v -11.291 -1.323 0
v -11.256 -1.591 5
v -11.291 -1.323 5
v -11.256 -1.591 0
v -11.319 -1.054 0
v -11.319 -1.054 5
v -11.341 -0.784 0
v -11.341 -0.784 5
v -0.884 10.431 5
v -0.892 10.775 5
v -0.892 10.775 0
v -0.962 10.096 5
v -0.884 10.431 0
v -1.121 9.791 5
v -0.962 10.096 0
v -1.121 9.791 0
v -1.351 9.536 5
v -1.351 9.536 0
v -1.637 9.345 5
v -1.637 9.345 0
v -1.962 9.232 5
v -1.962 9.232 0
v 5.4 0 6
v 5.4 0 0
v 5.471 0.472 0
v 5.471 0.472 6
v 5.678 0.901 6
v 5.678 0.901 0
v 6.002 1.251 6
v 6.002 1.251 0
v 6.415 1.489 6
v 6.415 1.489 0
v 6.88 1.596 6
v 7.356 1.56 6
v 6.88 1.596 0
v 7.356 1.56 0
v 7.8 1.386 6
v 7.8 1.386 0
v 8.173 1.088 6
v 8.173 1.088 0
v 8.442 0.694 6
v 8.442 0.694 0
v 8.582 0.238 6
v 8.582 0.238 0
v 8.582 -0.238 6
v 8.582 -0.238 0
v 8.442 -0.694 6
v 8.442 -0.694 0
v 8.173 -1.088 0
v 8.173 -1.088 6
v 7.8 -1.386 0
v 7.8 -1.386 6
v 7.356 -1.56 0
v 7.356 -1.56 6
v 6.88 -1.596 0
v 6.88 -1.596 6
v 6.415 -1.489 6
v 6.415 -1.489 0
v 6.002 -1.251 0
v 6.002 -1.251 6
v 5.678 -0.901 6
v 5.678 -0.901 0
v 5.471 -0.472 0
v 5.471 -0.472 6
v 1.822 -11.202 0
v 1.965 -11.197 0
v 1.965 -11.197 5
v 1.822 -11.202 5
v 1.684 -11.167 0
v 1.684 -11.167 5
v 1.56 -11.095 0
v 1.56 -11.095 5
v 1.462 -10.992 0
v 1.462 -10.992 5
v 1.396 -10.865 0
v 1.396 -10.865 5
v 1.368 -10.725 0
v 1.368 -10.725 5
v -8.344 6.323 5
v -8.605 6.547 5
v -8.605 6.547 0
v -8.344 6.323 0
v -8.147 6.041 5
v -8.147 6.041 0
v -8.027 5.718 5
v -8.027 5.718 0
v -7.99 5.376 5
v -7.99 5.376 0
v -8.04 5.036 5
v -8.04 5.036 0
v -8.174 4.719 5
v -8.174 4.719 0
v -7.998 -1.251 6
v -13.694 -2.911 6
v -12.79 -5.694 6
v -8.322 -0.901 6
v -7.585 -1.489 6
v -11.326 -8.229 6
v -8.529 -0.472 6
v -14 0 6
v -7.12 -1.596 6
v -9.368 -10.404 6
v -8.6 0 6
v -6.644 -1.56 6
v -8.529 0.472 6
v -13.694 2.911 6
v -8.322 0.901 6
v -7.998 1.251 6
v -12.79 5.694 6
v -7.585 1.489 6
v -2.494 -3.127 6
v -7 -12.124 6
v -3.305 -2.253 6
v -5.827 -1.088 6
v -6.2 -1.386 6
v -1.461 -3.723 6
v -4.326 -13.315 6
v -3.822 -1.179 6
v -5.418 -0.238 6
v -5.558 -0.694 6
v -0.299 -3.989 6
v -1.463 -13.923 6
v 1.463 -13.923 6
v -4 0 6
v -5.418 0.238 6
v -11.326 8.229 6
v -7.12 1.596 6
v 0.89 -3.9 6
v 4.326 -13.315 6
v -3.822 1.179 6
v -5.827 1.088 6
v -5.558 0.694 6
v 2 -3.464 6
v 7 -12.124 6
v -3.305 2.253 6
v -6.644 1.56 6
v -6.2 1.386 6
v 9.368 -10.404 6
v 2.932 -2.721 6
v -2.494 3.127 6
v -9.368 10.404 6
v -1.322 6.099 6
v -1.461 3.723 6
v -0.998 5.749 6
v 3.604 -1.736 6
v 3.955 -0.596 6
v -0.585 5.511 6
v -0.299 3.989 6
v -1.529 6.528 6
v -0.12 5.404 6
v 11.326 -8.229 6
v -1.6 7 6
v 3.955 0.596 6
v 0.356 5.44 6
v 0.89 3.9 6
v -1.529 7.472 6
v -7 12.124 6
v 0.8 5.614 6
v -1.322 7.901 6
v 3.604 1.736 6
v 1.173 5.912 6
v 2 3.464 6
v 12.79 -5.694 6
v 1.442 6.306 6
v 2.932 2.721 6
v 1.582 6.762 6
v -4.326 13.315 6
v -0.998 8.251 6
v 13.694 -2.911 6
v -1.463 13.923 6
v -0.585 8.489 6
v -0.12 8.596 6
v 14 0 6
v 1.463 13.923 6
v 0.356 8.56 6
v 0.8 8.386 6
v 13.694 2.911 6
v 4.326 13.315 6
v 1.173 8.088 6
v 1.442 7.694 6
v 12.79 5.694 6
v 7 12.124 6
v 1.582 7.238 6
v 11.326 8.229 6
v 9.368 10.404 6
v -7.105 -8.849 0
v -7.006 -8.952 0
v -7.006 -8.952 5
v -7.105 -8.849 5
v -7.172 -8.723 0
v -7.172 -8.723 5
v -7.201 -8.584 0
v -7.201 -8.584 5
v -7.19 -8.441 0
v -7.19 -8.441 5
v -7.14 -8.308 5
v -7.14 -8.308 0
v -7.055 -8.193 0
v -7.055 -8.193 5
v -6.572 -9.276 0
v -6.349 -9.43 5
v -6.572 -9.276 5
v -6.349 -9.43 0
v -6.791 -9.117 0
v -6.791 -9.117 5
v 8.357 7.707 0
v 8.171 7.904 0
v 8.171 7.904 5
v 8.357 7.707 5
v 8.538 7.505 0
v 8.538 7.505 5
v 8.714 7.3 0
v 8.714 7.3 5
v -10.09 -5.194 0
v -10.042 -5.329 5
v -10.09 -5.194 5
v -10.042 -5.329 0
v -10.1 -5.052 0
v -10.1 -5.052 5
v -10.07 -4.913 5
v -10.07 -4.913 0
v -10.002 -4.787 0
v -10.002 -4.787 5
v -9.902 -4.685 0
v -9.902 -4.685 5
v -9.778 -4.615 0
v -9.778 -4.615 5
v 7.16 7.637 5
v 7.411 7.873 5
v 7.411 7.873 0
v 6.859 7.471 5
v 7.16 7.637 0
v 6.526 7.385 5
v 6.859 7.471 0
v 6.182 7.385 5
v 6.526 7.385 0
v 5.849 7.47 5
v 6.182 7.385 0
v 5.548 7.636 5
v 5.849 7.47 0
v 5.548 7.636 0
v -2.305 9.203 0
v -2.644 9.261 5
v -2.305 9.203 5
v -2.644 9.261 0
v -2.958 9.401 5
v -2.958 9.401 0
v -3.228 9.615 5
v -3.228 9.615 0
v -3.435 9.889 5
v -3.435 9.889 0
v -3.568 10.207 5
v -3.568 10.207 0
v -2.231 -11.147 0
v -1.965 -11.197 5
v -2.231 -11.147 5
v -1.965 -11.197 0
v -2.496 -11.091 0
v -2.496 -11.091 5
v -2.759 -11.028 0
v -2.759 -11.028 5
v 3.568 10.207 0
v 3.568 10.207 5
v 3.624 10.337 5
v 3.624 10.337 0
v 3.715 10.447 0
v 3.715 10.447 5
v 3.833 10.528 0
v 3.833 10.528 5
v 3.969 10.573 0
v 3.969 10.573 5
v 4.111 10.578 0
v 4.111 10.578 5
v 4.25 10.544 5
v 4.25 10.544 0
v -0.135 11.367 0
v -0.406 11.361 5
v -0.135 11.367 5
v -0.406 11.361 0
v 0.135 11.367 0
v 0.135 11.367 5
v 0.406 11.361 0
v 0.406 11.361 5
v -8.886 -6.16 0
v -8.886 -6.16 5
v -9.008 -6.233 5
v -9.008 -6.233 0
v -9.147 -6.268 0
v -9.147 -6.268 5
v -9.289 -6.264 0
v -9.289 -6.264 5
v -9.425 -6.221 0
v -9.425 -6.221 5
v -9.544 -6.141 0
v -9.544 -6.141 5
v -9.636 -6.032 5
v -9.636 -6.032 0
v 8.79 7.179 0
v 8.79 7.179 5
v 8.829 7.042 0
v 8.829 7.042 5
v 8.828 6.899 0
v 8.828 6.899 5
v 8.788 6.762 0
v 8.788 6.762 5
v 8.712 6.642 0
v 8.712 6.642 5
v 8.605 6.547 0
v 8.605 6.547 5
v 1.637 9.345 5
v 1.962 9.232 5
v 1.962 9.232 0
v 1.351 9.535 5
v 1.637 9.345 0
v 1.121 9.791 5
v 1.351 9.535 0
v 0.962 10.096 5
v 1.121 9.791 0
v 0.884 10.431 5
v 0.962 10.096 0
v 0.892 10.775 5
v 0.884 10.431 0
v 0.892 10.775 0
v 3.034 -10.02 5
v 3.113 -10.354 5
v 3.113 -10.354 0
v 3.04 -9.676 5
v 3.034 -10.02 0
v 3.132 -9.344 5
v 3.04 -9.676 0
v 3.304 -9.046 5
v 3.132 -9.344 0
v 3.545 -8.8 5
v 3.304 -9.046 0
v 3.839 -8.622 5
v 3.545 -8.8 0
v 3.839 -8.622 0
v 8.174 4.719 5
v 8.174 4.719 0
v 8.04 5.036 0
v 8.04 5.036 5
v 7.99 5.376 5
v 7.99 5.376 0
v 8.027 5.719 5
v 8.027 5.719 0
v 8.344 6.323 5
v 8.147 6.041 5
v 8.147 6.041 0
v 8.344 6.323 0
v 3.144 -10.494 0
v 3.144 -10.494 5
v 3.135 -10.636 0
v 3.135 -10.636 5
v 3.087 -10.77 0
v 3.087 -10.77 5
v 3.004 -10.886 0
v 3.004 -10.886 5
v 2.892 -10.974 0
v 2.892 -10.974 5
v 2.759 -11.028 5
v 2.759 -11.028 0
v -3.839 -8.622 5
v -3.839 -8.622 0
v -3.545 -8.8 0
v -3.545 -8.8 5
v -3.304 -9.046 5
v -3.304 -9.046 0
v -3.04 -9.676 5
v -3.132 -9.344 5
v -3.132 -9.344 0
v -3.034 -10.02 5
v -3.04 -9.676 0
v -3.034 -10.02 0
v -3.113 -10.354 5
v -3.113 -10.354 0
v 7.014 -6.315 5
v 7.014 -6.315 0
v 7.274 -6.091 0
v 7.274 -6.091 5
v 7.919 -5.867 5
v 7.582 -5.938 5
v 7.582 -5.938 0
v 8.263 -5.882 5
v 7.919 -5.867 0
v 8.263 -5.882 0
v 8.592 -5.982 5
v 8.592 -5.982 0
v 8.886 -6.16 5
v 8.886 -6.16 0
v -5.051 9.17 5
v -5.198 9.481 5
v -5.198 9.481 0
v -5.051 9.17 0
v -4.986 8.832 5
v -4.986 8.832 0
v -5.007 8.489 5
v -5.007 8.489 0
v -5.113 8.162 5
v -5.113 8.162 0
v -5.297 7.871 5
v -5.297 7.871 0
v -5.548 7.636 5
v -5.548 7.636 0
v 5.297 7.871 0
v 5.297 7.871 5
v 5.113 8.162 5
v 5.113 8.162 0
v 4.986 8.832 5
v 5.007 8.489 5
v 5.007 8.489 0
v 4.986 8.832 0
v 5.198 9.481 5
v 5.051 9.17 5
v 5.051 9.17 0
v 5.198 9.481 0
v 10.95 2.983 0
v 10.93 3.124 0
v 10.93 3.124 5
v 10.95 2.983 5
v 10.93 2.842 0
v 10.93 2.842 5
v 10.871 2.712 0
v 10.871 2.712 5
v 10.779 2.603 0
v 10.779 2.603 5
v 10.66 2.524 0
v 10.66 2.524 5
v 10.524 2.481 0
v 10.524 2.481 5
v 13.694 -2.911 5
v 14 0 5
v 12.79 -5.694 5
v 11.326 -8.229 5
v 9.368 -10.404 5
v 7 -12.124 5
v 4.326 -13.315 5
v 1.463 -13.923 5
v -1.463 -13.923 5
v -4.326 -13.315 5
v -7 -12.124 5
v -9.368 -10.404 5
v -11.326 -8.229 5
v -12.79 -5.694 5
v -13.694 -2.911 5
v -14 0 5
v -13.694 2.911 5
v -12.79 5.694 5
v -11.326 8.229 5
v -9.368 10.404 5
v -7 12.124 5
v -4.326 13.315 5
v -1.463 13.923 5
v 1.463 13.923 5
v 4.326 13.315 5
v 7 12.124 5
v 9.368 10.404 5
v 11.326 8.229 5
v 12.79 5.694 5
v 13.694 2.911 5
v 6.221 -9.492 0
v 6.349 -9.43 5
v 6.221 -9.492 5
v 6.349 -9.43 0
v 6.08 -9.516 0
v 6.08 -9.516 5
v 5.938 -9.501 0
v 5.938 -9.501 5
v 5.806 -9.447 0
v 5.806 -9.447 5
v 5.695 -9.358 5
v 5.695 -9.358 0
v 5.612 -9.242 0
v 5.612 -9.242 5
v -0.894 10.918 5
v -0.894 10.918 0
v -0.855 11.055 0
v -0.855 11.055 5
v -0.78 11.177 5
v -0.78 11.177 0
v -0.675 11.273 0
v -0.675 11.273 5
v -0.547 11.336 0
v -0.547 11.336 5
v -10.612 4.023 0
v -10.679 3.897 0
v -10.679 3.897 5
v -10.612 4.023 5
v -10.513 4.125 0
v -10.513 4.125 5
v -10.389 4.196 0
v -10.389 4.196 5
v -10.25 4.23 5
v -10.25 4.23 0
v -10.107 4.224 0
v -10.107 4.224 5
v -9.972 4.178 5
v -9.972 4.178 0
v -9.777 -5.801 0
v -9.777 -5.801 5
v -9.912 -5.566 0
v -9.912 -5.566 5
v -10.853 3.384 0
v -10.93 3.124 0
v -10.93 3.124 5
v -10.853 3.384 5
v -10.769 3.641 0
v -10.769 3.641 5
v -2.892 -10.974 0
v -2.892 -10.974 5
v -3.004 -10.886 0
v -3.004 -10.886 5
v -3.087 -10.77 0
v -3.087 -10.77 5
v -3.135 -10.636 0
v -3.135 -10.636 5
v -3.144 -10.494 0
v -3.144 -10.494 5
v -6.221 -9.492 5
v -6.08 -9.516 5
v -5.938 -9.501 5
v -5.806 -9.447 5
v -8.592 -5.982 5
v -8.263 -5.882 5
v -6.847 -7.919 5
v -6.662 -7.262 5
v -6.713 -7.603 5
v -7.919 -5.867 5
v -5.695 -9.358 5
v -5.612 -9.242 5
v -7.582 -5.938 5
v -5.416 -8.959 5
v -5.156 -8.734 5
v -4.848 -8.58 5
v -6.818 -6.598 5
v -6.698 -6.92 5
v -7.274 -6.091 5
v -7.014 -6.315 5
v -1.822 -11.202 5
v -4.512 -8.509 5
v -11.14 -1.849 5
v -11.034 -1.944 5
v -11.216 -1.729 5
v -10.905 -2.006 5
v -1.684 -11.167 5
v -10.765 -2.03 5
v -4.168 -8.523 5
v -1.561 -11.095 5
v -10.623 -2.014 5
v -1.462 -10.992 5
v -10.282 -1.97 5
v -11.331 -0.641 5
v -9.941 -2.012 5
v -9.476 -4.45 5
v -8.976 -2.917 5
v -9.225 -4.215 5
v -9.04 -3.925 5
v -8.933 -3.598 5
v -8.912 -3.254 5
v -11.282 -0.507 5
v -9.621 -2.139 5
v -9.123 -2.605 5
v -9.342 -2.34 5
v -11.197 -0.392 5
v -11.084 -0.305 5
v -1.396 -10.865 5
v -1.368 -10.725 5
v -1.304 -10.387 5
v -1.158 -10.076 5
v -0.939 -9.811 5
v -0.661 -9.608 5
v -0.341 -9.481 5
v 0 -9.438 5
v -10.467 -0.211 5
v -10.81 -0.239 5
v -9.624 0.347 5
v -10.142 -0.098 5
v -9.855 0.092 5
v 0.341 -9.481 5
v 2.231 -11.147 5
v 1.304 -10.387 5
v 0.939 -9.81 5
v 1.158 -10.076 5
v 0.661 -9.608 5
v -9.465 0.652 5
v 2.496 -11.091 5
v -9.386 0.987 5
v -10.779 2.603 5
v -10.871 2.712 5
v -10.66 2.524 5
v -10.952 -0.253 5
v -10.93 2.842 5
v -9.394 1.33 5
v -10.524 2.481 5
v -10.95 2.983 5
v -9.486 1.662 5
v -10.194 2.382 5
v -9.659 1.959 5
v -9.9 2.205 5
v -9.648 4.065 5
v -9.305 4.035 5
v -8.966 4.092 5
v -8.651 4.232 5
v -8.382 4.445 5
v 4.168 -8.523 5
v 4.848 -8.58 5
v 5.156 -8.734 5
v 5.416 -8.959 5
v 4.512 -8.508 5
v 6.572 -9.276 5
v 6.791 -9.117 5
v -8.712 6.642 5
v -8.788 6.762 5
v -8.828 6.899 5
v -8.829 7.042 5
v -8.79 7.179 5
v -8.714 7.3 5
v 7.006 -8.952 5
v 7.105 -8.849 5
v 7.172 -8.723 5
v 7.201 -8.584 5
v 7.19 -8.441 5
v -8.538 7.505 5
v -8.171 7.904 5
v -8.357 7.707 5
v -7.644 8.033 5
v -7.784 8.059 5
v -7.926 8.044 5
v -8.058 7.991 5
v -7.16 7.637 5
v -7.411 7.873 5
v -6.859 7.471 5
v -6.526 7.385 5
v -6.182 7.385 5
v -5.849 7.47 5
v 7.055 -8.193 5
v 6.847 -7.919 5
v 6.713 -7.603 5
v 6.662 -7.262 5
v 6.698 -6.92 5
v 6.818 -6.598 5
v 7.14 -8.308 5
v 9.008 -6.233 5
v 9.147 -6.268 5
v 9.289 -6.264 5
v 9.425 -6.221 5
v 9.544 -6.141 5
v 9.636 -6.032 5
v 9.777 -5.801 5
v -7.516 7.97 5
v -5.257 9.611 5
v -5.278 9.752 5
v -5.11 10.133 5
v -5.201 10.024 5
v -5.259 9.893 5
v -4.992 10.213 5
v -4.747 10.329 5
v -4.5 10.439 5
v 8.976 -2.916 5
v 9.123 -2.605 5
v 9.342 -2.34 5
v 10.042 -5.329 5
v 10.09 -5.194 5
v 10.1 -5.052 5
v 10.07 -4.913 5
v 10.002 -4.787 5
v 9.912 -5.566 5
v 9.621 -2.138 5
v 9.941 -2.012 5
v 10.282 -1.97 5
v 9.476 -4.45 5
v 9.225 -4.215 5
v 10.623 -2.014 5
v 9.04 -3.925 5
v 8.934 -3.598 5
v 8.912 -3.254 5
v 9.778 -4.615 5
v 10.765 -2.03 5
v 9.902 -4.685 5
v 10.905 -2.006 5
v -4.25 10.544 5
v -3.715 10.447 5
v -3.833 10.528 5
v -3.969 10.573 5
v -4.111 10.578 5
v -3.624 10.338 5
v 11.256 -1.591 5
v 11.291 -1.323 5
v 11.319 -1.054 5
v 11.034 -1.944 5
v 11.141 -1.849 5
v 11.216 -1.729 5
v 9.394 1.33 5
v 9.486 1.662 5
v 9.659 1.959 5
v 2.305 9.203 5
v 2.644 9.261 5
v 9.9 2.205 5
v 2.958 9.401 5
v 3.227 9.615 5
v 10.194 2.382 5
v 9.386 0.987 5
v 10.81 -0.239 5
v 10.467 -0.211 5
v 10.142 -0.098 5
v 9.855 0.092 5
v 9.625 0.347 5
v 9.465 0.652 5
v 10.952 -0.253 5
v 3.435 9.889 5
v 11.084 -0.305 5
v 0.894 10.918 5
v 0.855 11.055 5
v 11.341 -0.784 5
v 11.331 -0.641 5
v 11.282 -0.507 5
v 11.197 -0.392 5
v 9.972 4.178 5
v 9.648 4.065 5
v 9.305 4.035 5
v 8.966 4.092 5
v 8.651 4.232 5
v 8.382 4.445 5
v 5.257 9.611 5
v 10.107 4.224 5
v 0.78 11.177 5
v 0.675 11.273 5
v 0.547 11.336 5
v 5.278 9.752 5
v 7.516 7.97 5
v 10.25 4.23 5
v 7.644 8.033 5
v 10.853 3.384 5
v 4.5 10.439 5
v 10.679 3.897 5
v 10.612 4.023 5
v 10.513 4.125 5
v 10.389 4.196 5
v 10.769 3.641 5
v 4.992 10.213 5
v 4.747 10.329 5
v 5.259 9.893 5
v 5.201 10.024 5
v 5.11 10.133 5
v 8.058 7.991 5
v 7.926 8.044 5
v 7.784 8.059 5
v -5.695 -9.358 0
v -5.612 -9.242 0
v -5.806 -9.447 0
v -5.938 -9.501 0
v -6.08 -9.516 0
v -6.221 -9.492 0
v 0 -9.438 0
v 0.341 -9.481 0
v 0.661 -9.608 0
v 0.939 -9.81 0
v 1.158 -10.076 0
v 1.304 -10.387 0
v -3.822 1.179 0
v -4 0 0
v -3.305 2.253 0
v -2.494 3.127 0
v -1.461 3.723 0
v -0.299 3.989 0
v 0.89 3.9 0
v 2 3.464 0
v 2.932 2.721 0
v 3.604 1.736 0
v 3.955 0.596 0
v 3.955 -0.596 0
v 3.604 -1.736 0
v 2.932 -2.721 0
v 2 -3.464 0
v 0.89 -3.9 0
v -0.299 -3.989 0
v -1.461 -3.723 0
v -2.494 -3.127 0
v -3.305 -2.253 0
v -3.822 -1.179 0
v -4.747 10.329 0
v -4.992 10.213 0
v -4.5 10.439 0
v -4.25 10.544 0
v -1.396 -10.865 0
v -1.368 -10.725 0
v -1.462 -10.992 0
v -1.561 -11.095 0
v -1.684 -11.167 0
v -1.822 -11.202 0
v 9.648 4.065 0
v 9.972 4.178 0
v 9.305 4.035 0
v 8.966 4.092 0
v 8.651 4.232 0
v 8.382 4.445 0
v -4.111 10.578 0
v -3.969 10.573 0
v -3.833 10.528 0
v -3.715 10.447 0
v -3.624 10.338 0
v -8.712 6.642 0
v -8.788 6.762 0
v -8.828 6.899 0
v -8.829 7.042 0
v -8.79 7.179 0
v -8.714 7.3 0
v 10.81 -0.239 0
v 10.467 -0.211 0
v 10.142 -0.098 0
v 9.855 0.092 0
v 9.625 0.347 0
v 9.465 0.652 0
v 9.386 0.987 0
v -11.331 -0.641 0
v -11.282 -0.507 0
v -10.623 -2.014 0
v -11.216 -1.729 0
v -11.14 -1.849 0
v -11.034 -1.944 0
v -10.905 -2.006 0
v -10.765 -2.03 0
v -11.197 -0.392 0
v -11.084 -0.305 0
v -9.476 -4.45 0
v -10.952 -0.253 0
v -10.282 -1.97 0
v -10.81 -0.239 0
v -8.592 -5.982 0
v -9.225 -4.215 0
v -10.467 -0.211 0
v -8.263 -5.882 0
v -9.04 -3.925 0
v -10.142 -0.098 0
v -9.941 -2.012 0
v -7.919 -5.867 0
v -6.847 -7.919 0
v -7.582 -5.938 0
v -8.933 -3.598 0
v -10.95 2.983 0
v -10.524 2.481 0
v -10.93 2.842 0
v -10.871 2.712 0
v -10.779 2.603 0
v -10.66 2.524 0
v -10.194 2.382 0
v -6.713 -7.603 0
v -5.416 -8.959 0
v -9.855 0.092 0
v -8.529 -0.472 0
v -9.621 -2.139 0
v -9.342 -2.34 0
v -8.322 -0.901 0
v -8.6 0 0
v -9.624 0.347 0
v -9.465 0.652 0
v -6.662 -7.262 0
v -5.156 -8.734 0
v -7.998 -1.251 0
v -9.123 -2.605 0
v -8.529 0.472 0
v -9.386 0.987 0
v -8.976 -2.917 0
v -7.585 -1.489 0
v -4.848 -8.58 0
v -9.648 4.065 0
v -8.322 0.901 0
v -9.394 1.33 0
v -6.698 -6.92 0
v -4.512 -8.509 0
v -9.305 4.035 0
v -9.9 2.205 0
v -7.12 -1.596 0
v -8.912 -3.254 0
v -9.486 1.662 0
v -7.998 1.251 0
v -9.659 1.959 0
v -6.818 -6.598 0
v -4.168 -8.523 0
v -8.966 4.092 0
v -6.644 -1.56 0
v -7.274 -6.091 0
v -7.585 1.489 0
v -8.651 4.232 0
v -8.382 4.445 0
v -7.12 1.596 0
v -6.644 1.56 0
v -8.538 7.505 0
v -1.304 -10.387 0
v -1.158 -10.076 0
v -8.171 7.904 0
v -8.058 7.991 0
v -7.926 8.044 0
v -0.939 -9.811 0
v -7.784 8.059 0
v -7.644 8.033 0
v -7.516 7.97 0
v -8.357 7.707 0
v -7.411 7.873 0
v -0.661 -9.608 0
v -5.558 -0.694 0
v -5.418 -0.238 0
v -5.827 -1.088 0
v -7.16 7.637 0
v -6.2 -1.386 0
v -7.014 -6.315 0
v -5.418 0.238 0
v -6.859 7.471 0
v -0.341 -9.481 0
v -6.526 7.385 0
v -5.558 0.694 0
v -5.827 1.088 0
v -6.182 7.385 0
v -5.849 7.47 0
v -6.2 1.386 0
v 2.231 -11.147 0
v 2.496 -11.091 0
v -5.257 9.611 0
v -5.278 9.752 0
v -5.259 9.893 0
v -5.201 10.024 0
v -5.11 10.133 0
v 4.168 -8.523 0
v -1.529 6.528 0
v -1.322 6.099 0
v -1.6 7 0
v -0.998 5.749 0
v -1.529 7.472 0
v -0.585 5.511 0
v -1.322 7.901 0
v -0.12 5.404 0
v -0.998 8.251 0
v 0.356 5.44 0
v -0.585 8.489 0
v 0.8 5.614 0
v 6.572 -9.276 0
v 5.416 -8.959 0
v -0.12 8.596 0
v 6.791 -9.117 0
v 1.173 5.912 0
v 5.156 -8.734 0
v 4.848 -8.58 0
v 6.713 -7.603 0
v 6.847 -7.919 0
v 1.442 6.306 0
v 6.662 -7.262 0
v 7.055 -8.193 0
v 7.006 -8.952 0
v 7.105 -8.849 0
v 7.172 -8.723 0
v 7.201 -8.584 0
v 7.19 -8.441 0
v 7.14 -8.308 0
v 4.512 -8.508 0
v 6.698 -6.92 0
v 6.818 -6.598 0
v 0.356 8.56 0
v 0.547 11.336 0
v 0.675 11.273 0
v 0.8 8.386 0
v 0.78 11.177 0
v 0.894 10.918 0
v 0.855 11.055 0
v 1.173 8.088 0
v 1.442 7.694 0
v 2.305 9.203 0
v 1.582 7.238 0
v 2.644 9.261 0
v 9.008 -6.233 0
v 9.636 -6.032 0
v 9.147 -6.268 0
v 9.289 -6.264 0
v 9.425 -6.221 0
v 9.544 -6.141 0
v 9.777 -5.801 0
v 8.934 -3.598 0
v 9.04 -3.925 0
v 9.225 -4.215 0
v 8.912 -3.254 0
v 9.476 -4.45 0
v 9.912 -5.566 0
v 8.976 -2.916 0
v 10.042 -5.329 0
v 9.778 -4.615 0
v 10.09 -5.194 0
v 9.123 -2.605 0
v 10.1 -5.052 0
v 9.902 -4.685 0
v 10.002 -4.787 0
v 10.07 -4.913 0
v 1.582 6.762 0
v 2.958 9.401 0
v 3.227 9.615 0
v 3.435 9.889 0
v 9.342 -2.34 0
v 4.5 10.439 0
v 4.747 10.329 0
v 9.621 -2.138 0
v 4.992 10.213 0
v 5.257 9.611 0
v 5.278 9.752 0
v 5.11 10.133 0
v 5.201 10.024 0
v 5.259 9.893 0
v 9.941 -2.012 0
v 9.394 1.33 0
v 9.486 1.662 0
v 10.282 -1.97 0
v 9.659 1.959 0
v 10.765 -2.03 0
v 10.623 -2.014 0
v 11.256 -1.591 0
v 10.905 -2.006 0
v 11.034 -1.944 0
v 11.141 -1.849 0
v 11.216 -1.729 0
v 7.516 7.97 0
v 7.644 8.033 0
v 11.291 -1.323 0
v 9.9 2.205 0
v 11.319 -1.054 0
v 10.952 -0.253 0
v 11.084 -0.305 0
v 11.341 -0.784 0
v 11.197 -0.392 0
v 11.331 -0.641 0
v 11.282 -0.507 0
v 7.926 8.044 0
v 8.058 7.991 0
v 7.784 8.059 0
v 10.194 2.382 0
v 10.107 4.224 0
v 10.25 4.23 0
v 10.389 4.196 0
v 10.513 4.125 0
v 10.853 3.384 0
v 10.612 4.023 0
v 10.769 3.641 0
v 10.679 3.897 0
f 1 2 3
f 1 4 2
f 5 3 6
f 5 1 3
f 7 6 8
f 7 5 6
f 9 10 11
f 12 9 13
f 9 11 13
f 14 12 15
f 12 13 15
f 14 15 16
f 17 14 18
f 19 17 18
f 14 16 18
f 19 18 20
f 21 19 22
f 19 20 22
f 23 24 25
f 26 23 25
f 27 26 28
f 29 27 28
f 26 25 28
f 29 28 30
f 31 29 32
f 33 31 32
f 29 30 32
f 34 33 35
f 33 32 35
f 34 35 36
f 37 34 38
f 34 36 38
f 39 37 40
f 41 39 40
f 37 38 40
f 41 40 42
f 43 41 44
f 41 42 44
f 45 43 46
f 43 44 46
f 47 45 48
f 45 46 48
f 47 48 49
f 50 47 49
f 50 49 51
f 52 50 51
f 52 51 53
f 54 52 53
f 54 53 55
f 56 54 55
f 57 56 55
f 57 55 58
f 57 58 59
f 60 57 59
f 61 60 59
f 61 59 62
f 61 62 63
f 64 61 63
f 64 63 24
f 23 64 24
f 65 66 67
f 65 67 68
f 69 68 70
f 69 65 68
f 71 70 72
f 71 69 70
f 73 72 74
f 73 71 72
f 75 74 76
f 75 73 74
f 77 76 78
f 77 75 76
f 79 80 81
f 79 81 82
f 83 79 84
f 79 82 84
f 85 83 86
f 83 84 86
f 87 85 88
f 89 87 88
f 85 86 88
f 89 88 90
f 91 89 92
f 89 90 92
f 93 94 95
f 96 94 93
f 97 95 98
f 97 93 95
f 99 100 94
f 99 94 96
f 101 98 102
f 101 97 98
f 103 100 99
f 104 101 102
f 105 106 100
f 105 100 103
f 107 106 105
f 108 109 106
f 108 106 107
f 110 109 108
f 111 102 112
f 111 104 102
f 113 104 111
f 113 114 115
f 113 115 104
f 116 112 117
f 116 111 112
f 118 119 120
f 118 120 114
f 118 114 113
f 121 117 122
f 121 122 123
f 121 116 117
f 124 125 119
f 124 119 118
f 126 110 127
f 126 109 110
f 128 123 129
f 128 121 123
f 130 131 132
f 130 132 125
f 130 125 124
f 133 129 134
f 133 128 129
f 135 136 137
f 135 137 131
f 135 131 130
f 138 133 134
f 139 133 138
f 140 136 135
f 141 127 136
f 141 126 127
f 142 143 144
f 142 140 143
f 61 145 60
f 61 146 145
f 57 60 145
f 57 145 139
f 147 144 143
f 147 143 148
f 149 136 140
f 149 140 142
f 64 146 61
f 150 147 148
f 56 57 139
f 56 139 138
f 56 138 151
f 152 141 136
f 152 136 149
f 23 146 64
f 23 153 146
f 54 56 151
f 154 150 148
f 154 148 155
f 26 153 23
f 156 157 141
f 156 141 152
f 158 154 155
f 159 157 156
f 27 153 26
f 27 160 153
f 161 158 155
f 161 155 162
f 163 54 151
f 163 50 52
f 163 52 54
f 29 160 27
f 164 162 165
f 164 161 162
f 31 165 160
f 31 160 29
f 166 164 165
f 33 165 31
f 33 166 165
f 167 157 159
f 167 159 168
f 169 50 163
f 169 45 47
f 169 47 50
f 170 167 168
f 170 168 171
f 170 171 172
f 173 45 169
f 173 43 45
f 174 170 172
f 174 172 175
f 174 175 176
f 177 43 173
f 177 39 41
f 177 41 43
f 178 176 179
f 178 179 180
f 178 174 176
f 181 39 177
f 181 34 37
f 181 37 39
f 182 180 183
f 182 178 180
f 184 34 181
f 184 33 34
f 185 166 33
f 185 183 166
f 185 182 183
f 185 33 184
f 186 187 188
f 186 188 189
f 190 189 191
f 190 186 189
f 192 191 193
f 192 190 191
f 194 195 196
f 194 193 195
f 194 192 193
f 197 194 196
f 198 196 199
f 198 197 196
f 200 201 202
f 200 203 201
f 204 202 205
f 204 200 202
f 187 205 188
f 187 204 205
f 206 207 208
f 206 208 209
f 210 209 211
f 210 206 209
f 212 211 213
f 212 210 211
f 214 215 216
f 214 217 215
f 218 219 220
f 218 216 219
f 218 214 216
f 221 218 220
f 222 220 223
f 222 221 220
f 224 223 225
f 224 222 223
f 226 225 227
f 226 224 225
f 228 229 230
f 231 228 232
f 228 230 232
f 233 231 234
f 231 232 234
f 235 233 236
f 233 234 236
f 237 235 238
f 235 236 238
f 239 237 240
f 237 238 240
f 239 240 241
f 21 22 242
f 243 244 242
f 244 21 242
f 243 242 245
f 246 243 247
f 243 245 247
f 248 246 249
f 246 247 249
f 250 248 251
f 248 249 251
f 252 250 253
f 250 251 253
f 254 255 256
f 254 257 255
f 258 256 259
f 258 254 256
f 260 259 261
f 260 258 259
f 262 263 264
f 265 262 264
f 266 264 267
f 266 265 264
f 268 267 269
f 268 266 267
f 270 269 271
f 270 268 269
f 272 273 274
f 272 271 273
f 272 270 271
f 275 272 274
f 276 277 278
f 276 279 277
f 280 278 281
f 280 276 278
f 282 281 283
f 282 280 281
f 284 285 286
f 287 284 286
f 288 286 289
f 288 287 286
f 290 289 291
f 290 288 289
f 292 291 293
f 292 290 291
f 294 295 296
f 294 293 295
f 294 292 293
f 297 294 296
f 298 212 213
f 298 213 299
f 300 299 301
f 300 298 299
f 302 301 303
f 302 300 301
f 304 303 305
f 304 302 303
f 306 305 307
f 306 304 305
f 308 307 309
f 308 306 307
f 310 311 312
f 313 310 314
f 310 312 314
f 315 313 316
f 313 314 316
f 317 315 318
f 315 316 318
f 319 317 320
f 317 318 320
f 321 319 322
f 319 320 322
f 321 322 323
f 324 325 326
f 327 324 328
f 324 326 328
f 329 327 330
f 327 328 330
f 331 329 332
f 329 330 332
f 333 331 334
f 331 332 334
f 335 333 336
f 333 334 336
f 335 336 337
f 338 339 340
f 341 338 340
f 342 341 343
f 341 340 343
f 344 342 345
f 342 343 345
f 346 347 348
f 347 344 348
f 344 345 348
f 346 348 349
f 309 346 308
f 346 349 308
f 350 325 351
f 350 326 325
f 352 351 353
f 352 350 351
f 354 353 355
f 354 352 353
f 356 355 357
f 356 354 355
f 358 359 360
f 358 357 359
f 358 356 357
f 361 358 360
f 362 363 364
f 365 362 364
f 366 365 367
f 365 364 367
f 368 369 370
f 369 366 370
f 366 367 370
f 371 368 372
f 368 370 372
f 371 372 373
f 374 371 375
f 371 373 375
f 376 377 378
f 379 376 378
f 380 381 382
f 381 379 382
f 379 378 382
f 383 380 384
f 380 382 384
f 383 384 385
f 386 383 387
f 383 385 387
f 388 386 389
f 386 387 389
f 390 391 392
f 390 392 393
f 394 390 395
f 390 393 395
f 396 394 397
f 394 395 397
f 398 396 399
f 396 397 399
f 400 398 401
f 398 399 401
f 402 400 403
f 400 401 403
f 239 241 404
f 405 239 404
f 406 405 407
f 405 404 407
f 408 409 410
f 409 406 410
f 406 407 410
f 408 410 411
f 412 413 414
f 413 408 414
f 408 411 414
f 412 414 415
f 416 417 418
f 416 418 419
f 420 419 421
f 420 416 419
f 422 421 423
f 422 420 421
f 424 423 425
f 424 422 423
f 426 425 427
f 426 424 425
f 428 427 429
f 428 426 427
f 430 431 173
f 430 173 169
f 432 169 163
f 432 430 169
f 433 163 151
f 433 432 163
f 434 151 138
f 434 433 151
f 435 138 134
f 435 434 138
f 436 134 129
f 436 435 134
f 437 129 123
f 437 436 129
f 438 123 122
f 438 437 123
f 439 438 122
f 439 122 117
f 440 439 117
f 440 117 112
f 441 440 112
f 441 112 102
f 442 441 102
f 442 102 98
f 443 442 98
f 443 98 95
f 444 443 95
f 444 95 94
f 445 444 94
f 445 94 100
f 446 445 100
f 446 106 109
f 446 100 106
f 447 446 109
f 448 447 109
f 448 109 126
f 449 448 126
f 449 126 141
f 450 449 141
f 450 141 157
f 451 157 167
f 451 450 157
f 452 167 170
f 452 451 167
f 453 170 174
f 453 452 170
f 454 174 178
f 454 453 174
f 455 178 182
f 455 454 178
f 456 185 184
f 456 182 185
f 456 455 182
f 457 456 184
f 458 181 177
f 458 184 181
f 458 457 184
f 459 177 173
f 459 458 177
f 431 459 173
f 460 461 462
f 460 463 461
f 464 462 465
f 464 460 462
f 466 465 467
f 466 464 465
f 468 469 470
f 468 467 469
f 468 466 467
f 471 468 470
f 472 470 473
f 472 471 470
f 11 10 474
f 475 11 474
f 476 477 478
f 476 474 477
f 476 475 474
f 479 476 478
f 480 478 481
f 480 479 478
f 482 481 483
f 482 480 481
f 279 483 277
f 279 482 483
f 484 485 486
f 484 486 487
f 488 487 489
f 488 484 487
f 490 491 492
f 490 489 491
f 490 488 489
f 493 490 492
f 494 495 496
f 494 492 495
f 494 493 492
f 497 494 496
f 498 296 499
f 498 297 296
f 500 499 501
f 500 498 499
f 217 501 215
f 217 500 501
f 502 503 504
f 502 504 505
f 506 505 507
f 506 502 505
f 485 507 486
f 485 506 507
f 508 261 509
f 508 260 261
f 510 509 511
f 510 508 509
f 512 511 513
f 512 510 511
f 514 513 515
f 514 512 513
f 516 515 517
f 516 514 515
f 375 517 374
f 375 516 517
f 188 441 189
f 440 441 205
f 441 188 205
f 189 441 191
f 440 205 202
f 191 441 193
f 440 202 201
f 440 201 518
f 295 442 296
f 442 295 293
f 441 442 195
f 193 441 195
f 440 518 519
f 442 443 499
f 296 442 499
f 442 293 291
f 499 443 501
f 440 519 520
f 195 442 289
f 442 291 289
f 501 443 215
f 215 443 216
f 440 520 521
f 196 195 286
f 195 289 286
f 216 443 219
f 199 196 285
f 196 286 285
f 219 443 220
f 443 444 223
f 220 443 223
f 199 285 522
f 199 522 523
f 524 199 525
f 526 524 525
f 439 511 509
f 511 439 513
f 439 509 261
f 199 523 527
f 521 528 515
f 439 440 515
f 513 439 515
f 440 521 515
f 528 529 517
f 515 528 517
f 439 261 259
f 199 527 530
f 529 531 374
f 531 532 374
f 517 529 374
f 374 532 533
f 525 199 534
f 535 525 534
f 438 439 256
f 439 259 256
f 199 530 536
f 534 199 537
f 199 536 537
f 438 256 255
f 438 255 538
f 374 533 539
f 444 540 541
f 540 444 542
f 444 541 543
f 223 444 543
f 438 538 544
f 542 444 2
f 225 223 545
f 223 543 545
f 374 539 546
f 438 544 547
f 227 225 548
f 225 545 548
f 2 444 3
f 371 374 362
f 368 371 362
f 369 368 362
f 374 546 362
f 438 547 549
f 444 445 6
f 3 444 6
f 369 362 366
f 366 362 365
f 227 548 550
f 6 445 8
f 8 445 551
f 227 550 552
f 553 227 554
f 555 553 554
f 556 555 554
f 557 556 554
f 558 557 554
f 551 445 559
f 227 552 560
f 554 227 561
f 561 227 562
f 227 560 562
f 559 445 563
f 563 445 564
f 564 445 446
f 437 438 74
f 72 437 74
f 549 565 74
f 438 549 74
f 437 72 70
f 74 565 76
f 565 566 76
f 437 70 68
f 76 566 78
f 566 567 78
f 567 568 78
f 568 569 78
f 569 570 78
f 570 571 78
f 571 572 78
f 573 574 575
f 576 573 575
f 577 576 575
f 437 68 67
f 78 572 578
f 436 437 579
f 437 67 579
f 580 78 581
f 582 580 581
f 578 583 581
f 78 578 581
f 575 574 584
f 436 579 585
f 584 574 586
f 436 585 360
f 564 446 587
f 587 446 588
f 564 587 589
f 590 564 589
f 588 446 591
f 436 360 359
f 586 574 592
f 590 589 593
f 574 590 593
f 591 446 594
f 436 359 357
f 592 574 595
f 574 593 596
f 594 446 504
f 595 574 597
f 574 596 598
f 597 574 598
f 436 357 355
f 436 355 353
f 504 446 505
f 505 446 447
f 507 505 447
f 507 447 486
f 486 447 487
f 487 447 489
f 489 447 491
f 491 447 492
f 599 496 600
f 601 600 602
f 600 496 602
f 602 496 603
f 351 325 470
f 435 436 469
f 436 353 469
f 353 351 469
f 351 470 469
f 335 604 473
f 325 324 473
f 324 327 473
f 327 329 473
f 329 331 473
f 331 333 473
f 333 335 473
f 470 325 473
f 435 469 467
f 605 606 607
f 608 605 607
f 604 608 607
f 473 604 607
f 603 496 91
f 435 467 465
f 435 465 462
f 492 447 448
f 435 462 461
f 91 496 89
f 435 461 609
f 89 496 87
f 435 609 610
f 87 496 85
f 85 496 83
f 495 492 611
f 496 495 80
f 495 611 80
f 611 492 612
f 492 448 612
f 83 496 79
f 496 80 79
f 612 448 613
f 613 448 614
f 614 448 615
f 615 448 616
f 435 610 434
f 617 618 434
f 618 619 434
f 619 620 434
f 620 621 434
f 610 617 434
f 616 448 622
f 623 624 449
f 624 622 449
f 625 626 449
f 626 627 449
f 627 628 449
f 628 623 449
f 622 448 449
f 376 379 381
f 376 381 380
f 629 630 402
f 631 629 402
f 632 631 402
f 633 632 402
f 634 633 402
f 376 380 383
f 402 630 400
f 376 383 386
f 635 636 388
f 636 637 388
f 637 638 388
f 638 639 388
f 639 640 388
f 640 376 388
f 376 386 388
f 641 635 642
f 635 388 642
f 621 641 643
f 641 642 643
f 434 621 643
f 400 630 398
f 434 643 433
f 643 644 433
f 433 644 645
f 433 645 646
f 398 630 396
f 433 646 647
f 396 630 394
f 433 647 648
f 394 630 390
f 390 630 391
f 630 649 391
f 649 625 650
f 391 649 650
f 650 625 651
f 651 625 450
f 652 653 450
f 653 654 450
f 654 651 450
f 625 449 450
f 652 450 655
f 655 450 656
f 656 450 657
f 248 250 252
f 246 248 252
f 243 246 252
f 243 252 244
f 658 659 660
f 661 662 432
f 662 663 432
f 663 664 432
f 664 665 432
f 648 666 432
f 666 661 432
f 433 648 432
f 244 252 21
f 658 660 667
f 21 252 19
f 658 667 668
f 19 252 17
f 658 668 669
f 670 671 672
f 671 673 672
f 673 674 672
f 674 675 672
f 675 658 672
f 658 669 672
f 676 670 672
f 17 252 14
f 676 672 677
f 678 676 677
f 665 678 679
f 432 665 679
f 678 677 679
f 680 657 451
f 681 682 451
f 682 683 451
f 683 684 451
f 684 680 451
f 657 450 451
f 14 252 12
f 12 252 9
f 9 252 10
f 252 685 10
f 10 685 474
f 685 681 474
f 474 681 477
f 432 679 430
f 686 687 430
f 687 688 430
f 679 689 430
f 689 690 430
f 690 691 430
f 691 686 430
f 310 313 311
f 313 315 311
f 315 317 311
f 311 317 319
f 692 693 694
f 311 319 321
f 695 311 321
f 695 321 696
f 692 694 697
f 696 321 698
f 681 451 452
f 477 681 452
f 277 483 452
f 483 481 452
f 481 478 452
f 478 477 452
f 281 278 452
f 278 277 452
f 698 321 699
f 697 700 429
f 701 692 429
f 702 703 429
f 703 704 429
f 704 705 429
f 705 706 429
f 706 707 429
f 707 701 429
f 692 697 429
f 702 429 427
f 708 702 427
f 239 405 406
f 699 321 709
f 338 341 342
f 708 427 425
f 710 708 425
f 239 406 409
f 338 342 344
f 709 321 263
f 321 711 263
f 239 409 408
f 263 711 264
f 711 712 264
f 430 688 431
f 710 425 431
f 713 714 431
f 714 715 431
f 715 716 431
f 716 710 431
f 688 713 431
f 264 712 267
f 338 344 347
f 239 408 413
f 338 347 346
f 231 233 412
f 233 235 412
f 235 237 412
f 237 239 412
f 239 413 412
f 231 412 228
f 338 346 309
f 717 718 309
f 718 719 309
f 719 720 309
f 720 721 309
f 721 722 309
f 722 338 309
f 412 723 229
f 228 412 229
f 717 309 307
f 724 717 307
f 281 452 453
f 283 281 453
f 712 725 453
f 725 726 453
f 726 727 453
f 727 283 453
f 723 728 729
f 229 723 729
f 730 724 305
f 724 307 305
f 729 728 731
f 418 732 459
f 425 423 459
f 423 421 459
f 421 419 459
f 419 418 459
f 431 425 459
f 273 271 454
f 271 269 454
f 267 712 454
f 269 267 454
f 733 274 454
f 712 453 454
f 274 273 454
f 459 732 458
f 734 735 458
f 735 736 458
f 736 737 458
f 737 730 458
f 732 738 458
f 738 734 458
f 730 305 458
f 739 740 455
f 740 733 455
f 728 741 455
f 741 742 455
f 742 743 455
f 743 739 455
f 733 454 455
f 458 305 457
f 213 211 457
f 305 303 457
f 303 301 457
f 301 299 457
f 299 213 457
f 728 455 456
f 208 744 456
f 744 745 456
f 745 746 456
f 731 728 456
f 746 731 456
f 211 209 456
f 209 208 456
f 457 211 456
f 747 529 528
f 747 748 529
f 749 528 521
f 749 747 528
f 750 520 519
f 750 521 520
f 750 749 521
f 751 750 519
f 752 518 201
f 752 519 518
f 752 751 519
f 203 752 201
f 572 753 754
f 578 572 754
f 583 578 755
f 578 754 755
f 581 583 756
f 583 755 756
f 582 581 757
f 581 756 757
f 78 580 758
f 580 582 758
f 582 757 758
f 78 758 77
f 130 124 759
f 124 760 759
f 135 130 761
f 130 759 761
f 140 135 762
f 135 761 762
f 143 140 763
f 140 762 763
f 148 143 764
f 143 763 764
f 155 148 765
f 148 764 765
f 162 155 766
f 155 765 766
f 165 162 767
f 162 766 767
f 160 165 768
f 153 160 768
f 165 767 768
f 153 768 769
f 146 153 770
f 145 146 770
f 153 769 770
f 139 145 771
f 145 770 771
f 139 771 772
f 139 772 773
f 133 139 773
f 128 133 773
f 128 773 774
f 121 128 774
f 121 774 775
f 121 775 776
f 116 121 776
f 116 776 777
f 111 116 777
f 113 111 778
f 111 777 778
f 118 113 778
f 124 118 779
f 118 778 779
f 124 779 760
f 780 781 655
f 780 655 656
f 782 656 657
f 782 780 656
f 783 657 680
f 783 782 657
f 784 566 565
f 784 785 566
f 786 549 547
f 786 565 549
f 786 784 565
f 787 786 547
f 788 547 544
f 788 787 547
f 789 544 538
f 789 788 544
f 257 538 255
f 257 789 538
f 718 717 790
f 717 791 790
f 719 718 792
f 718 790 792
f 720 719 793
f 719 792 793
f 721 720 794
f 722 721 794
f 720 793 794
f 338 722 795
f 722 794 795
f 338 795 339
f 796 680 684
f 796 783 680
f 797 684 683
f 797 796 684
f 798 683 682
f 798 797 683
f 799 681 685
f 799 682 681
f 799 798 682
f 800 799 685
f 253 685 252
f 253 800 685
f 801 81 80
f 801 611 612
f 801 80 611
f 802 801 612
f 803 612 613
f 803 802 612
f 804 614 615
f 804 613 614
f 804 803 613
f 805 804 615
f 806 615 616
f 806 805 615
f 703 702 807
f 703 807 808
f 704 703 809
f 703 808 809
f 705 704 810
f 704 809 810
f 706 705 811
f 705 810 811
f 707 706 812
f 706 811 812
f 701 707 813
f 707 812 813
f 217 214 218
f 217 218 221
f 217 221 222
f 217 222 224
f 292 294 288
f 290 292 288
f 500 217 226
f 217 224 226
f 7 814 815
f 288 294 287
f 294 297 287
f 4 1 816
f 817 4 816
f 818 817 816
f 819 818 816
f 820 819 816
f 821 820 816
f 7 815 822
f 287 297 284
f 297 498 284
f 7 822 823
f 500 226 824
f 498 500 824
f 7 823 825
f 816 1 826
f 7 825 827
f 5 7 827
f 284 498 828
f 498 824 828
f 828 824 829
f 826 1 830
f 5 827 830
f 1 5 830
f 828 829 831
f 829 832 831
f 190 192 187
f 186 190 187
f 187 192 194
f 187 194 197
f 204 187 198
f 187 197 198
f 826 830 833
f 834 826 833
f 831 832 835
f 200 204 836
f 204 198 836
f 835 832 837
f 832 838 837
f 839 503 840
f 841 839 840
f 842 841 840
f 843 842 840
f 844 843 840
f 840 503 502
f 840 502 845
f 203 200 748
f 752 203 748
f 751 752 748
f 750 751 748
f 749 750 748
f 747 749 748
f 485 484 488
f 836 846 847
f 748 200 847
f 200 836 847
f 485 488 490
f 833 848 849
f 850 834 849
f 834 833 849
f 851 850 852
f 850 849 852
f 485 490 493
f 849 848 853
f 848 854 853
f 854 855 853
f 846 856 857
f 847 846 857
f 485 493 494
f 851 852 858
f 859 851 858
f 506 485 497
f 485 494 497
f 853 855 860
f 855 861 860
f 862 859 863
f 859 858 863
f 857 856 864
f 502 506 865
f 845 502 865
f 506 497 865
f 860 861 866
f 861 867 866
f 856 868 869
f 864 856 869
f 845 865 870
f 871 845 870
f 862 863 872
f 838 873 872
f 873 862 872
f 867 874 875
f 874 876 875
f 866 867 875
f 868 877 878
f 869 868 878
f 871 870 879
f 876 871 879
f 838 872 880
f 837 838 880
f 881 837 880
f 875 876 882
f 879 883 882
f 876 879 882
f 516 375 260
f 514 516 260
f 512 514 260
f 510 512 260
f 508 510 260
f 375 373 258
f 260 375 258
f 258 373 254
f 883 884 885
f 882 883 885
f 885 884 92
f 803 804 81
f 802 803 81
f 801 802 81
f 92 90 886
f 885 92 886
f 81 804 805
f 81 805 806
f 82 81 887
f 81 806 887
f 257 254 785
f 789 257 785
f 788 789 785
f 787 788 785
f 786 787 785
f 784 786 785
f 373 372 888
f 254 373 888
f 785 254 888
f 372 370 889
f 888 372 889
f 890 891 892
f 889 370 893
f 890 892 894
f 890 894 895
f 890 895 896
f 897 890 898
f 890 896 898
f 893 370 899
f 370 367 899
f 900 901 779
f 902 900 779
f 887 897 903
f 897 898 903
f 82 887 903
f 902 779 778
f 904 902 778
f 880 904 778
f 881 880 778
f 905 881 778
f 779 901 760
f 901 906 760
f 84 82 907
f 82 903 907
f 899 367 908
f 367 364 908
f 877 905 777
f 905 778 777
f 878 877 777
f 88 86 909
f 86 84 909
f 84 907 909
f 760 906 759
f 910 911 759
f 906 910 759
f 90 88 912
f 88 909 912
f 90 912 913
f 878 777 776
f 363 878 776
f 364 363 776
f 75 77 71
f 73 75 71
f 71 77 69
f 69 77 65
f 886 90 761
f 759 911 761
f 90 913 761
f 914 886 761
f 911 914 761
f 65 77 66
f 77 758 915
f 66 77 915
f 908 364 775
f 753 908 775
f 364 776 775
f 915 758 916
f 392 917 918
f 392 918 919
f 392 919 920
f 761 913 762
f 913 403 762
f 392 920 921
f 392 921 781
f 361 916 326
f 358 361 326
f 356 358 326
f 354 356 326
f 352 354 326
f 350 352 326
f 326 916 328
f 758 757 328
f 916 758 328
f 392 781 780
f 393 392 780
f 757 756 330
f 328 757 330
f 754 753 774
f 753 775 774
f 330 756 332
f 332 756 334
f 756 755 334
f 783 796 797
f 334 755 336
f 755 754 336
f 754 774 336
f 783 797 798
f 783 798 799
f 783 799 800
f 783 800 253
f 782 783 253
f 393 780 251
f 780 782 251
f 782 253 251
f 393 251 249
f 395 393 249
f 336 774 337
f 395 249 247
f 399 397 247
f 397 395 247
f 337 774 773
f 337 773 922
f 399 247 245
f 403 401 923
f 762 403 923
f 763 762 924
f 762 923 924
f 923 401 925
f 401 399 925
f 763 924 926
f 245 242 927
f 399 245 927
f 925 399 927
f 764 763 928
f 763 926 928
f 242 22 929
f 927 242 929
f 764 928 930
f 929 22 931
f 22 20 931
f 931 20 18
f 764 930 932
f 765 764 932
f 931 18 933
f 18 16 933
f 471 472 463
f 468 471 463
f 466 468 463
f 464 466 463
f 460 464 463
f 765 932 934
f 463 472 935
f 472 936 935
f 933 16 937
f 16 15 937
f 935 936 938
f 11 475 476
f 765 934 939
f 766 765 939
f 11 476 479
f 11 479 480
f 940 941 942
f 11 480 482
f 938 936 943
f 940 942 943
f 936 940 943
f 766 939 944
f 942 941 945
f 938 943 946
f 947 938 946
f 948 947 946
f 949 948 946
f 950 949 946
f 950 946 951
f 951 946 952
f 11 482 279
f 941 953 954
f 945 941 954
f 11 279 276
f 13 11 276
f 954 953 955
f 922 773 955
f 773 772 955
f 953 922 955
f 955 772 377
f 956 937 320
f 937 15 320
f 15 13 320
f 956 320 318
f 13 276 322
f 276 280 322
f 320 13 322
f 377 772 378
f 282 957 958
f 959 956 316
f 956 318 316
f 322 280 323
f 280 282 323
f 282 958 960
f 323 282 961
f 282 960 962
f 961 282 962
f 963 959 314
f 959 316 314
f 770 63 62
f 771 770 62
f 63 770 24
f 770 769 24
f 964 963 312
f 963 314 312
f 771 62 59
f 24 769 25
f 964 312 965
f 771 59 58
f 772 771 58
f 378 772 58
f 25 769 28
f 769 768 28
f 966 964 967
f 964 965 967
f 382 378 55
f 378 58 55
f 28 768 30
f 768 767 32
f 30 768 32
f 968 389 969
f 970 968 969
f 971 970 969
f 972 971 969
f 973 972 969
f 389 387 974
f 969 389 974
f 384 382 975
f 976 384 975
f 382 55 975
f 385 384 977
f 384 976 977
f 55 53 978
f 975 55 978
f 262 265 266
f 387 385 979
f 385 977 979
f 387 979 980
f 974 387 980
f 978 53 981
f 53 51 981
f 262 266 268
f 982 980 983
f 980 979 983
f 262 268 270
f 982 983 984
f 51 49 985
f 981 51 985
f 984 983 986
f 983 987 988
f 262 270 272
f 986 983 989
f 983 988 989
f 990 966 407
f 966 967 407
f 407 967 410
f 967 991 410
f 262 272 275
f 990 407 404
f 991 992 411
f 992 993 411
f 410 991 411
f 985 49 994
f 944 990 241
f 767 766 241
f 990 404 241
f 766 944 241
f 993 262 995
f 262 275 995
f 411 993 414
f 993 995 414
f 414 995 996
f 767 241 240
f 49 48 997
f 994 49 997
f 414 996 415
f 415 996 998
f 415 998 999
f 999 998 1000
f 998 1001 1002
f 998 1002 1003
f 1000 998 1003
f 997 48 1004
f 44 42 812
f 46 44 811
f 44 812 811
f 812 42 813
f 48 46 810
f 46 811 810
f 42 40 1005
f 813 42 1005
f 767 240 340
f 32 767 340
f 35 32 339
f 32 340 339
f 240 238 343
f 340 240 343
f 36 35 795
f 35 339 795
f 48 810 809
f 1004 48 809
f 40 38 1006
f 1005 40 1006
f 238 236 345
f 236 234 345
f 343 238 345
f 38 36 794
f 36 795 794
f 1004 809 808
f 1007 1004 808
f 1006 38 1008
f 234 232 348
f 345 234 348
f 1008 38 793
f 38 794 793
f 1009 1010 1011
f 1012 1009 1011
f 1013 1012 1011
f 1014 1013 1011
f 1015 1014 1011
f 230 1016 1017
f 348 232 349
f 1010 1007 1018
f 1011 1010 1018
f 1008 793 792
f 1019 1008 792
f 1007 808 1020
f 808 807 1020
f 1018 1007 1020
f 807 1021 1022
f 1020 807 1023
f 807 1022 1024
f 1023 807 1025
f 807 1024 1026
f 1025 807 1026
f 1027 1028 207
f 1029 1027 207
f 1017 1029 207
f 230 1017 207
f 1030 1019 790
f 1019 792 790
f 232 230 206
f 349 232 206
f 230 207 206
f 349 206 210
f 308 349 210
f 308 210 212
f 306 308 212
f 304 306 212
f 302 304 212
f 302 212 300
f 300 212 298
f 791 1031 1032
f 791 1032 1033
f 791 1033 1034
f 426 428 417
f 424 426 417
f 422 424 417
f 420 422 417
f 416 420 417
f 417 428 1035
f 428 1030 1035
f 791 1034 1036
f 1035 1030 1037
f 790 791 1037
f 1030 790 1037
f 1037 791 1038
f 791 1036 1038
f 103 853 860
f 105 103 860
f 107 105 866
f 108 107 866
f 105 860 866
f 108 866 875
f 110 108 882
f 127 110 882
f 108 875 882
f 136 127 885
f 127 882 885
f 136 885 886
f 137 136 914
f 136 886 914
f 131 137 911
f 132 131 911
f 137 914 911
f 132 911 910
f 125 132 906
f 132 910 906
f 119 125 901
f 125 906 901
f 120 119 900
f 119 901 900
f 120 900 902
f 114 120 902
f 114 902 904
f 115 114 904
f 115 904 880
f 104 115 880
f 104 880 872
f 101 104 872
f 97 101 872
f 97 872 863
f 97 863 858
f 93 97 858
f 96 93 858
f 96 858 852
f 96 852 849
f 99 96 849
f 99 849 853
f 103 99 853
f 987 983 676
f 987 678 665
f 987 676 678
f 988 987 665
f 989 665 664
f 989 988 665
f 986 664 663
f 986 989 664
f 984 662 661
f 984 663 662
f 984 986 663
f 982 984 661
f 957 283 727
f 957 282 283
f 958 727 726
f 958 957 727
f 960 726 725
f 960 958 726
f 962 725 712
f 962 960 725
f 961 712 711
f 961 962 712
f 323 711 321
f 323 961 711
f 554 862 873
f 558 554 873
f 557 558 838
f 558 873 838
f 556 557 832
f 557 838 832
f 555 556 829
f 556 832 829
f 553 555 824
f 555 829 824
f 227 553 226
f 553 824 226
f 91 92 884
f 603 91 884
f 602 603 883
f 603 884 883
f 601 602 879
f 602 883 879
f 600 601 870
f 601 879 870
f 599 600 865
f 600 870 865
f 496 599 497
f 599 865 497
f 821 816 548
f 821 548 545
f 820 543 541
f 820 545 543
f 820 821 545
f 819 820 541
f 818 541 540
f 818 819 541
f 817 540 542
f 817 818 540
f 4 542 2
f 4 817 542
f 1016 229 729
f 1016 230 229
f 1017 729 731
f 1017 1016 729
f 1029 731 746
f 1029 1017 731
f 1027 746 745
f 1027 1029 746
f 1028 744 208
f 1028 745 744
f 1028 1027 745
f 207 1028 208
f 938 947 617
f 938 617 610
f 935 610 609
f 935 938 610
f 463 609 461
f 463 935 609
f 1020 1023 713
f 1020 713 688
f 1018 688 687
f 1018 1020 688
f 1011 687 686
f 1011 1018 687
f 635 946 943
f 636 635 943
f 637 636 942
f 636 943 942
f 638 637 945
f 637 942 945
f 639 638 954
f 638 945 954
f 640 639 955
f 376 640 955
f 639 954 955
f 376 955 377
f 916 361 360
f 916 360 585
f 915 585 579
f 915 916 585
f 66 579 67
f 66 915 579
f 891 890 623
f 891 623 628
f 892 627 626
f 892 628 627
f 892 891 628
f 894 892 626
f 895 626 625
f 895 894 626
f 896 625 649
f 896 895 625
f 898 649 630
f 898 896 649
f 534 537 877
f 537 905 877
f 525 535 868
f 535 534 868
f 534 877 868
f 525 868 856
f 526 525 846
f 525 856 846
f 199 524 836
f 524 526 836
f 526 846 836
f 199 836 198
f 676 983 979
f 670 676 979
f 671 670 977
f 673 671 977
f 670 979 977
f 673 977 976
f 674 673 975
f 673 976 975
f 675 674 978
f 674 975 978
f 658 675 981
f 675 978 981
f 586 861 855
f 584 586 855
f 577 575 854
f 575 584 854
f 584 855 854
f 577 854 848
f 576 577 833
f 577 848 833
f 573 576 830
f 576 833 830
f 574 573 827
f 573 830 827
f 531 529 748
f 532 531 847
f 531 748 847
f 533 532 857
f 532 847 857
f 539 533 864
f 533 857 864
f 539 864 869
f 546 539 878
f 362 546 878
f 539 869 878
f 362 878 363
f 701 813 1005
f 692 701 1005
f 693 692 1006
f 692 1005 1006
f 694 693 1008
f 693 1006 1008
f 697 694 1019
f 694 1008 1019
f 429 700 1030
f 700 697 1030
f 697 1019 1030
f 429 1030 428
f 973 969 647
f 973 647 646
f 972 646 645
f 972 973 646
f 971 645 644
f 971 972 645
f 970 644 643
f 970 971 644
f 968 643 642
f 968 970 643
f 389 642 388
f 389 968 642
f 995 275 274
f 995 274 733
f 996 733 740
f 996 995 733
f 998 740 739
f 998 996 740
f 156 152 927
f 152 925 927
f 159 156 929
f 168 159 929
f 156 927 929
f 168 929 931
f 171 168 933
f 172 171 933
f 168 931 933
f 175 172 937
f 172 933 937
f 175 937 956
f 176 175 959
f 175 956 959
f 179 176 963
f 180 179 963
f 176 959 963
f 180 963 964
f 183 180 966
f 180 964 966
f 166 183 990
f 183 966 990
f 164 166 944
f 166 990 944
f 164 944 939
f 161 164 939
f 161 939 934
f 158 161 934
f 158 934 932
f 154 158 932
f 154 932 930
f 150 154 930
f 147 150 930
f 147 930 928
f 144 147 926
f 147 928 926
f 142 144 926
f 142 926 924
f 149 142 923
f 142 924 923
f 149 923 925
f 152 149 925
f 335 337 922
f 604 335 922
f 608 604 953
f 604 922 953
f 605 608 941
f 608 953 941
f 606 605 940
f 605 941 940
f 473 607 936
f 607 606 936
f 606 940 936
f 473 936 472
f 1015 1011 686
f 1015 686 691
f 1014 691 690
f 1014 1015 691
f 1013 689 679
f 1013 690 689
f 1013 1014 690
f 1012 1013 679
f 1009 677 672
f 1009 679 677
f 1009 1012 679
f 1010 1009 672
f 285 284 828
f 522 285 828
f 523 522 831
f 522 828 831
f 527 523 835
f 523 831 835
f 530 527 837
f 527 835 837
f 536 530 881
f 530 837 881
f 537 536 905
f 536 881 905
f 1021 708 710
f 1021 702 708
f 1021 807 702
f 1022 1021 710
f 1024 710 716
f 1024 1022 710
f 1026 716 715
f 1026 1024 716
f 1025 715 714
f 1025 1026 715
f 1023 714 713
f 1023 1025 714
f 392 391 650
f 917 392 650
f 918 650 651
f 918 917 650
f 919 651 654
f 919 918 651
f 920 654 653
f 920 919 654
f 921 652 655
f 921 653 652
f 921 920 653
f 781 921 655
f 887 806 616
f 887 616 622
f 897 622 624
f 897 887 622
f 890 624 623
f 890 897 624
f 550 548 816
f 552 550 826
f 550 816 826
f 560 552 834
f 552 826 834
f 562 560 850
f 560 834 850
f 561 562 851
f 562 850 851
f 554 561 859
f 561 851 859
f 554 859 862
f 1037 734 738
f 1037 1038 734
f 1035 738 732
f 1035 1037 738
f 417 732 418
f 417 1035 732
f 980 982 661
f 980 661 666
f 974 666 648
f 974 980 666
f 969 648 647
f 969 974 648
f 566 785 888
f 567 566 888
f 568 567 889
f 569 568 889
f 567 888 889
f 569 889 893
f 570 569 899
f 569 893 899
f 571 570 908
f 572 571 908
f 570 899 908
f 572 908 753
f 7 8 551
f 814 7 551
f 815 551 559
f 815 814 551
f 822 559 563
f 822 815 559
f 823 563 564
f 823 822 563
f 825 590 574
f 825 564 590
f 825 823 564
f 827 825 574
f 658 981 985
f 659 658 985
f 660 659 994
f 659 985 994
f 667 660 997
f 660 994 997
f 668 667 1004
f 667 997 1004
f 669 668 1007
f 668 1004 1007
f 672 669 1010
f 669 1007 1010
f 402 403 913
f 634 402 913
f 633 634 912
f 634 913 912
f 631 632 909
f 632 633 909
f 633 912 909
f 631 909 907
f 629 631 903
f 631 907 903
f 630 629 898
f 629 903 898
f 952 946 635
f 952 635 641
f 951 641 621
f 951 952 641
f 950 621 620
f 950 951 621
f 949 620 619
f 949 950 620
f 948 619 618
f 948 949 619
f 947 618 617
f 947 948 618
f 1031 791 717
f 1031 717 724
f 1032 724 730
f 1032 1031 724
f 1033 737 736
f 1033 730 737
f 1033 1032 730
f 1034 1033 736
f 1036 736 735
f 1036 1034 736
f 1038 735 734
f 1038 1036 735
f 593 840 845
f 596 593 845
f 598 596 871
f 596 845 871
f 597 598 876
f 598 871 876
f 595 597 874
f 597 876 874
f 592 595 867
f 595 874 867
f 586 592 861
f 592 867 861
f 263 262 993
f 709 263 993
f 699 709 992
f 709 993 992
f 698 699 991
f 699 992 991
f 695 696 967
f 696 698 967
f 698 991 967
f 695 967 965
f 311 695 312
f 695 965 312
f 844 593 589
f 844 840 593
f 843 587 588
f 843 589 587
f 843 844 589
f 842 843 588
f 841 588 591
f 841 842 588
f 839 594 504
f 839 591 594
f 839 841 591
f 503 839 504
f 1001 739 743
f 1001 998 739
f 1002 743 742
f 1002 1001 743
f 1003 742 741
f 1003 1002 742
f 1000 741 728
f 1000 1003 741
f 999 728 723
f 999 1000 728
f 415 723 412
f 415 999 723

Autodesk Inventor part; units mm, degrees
ref_plane "YZ Plane" through (0, 0, 0) normal (1, 0, 0) x (0, 1, 0)
ref_plane "XZ Plane" through (0, 0, 0) normal (0, 1, 0) x (-1, 0, 0)
ref_plane "XY Plane" through (0, 0, 0) normal (0, 0, 1) x (1, 0, 0)
sketch "スケッチ1" plane through (0, 0, 0) normal (0, 0, 1) x (1, 0, 0)
  arc A0 (0.7632, 11.9121) -> (-1.0179, 11.893) centre (0, 0) ccw construction
  arc A1 (0.4062, 11.3607) -> (-0.4062, 11.3607) centre (0, 0) ccw
  arc A2 (9.3048, 1.5803) -> (-9.0567, 2.6555) centre (0, 0) ccw construction
  arc A3 (0.8923, 10.7753) -> (1.9623, 9.2318) centre (2.2471, 10.5718) ccw
  line L0 (1.9623, 9.2318) -> (0, 0)
  arc A4 (-1.9623, 9.2318) -> (-0.8923, 10.7753) centre (-2.2471, 10.5718) ccw
  line L1 (-1.9623, 9.2318) -> (0, 0)
  arc A5 (-0.4062, 11.3607) -> (-0.8923, 10.7753) centre (-0.388, 10.8511) ccw
  arc A6 (0.8923, 10.7753) -> (0.4062, 11.3607) centre (0.388, 10.8511) ccw
  line L2 (0, 0) -> (0, 2.9942) construction
  dimension "d0" = 11.9365
  dimension "d1" = 11.368
  dimension "d2" = 1.93
  dimension "d3" = 0.51
  dimension "d4" = 1.37
  dimension "d5" = 1.37
  dimension "d6" = 24
  dimension "d7" = 12
extrude "押し出し1" add sketch "スケッチ1" along normal blind 5
pattern_circular "円形状パターン1" count 15 over 360 about axis through (0, 0, 0) along (0, 0, 1) of "押し出し1"
sketch "スケッチ2" plane through (0, 0, 5) normal (0, 0, 1) x (1, 0, 0)
  circle A0 centre (0, 0) radius 14
  dimension "d13" = 28
extrude "押し出し2" add sketch "スケッチ2" along normal blind 1
sketch "スケッチ3" plane through (0, 0, 0) normal (0, 0, -1) x (-1, 0, 0)
  circle A0 centre (0, 0) radius 4
  circle A1 centre (0, 7) radius 1.6
  circle A2 centre (-7, 0) radius 1.6
  circle A3 centre (7, 0) radius 1.6
  dimension "d16" = 8
  dimension "d18" = 3.2
  dimension "d19" = 7
  dimension "d20" = 3.2
  dimension "d21" = 3.2
  dimension "d22" = 7
  dimension "d23" = 7
extrude "押し出し3" cut sketch "スケッチ3" against normal through all
properties part number "プーリ_歯数15" material "アセタール樹脂、白"
